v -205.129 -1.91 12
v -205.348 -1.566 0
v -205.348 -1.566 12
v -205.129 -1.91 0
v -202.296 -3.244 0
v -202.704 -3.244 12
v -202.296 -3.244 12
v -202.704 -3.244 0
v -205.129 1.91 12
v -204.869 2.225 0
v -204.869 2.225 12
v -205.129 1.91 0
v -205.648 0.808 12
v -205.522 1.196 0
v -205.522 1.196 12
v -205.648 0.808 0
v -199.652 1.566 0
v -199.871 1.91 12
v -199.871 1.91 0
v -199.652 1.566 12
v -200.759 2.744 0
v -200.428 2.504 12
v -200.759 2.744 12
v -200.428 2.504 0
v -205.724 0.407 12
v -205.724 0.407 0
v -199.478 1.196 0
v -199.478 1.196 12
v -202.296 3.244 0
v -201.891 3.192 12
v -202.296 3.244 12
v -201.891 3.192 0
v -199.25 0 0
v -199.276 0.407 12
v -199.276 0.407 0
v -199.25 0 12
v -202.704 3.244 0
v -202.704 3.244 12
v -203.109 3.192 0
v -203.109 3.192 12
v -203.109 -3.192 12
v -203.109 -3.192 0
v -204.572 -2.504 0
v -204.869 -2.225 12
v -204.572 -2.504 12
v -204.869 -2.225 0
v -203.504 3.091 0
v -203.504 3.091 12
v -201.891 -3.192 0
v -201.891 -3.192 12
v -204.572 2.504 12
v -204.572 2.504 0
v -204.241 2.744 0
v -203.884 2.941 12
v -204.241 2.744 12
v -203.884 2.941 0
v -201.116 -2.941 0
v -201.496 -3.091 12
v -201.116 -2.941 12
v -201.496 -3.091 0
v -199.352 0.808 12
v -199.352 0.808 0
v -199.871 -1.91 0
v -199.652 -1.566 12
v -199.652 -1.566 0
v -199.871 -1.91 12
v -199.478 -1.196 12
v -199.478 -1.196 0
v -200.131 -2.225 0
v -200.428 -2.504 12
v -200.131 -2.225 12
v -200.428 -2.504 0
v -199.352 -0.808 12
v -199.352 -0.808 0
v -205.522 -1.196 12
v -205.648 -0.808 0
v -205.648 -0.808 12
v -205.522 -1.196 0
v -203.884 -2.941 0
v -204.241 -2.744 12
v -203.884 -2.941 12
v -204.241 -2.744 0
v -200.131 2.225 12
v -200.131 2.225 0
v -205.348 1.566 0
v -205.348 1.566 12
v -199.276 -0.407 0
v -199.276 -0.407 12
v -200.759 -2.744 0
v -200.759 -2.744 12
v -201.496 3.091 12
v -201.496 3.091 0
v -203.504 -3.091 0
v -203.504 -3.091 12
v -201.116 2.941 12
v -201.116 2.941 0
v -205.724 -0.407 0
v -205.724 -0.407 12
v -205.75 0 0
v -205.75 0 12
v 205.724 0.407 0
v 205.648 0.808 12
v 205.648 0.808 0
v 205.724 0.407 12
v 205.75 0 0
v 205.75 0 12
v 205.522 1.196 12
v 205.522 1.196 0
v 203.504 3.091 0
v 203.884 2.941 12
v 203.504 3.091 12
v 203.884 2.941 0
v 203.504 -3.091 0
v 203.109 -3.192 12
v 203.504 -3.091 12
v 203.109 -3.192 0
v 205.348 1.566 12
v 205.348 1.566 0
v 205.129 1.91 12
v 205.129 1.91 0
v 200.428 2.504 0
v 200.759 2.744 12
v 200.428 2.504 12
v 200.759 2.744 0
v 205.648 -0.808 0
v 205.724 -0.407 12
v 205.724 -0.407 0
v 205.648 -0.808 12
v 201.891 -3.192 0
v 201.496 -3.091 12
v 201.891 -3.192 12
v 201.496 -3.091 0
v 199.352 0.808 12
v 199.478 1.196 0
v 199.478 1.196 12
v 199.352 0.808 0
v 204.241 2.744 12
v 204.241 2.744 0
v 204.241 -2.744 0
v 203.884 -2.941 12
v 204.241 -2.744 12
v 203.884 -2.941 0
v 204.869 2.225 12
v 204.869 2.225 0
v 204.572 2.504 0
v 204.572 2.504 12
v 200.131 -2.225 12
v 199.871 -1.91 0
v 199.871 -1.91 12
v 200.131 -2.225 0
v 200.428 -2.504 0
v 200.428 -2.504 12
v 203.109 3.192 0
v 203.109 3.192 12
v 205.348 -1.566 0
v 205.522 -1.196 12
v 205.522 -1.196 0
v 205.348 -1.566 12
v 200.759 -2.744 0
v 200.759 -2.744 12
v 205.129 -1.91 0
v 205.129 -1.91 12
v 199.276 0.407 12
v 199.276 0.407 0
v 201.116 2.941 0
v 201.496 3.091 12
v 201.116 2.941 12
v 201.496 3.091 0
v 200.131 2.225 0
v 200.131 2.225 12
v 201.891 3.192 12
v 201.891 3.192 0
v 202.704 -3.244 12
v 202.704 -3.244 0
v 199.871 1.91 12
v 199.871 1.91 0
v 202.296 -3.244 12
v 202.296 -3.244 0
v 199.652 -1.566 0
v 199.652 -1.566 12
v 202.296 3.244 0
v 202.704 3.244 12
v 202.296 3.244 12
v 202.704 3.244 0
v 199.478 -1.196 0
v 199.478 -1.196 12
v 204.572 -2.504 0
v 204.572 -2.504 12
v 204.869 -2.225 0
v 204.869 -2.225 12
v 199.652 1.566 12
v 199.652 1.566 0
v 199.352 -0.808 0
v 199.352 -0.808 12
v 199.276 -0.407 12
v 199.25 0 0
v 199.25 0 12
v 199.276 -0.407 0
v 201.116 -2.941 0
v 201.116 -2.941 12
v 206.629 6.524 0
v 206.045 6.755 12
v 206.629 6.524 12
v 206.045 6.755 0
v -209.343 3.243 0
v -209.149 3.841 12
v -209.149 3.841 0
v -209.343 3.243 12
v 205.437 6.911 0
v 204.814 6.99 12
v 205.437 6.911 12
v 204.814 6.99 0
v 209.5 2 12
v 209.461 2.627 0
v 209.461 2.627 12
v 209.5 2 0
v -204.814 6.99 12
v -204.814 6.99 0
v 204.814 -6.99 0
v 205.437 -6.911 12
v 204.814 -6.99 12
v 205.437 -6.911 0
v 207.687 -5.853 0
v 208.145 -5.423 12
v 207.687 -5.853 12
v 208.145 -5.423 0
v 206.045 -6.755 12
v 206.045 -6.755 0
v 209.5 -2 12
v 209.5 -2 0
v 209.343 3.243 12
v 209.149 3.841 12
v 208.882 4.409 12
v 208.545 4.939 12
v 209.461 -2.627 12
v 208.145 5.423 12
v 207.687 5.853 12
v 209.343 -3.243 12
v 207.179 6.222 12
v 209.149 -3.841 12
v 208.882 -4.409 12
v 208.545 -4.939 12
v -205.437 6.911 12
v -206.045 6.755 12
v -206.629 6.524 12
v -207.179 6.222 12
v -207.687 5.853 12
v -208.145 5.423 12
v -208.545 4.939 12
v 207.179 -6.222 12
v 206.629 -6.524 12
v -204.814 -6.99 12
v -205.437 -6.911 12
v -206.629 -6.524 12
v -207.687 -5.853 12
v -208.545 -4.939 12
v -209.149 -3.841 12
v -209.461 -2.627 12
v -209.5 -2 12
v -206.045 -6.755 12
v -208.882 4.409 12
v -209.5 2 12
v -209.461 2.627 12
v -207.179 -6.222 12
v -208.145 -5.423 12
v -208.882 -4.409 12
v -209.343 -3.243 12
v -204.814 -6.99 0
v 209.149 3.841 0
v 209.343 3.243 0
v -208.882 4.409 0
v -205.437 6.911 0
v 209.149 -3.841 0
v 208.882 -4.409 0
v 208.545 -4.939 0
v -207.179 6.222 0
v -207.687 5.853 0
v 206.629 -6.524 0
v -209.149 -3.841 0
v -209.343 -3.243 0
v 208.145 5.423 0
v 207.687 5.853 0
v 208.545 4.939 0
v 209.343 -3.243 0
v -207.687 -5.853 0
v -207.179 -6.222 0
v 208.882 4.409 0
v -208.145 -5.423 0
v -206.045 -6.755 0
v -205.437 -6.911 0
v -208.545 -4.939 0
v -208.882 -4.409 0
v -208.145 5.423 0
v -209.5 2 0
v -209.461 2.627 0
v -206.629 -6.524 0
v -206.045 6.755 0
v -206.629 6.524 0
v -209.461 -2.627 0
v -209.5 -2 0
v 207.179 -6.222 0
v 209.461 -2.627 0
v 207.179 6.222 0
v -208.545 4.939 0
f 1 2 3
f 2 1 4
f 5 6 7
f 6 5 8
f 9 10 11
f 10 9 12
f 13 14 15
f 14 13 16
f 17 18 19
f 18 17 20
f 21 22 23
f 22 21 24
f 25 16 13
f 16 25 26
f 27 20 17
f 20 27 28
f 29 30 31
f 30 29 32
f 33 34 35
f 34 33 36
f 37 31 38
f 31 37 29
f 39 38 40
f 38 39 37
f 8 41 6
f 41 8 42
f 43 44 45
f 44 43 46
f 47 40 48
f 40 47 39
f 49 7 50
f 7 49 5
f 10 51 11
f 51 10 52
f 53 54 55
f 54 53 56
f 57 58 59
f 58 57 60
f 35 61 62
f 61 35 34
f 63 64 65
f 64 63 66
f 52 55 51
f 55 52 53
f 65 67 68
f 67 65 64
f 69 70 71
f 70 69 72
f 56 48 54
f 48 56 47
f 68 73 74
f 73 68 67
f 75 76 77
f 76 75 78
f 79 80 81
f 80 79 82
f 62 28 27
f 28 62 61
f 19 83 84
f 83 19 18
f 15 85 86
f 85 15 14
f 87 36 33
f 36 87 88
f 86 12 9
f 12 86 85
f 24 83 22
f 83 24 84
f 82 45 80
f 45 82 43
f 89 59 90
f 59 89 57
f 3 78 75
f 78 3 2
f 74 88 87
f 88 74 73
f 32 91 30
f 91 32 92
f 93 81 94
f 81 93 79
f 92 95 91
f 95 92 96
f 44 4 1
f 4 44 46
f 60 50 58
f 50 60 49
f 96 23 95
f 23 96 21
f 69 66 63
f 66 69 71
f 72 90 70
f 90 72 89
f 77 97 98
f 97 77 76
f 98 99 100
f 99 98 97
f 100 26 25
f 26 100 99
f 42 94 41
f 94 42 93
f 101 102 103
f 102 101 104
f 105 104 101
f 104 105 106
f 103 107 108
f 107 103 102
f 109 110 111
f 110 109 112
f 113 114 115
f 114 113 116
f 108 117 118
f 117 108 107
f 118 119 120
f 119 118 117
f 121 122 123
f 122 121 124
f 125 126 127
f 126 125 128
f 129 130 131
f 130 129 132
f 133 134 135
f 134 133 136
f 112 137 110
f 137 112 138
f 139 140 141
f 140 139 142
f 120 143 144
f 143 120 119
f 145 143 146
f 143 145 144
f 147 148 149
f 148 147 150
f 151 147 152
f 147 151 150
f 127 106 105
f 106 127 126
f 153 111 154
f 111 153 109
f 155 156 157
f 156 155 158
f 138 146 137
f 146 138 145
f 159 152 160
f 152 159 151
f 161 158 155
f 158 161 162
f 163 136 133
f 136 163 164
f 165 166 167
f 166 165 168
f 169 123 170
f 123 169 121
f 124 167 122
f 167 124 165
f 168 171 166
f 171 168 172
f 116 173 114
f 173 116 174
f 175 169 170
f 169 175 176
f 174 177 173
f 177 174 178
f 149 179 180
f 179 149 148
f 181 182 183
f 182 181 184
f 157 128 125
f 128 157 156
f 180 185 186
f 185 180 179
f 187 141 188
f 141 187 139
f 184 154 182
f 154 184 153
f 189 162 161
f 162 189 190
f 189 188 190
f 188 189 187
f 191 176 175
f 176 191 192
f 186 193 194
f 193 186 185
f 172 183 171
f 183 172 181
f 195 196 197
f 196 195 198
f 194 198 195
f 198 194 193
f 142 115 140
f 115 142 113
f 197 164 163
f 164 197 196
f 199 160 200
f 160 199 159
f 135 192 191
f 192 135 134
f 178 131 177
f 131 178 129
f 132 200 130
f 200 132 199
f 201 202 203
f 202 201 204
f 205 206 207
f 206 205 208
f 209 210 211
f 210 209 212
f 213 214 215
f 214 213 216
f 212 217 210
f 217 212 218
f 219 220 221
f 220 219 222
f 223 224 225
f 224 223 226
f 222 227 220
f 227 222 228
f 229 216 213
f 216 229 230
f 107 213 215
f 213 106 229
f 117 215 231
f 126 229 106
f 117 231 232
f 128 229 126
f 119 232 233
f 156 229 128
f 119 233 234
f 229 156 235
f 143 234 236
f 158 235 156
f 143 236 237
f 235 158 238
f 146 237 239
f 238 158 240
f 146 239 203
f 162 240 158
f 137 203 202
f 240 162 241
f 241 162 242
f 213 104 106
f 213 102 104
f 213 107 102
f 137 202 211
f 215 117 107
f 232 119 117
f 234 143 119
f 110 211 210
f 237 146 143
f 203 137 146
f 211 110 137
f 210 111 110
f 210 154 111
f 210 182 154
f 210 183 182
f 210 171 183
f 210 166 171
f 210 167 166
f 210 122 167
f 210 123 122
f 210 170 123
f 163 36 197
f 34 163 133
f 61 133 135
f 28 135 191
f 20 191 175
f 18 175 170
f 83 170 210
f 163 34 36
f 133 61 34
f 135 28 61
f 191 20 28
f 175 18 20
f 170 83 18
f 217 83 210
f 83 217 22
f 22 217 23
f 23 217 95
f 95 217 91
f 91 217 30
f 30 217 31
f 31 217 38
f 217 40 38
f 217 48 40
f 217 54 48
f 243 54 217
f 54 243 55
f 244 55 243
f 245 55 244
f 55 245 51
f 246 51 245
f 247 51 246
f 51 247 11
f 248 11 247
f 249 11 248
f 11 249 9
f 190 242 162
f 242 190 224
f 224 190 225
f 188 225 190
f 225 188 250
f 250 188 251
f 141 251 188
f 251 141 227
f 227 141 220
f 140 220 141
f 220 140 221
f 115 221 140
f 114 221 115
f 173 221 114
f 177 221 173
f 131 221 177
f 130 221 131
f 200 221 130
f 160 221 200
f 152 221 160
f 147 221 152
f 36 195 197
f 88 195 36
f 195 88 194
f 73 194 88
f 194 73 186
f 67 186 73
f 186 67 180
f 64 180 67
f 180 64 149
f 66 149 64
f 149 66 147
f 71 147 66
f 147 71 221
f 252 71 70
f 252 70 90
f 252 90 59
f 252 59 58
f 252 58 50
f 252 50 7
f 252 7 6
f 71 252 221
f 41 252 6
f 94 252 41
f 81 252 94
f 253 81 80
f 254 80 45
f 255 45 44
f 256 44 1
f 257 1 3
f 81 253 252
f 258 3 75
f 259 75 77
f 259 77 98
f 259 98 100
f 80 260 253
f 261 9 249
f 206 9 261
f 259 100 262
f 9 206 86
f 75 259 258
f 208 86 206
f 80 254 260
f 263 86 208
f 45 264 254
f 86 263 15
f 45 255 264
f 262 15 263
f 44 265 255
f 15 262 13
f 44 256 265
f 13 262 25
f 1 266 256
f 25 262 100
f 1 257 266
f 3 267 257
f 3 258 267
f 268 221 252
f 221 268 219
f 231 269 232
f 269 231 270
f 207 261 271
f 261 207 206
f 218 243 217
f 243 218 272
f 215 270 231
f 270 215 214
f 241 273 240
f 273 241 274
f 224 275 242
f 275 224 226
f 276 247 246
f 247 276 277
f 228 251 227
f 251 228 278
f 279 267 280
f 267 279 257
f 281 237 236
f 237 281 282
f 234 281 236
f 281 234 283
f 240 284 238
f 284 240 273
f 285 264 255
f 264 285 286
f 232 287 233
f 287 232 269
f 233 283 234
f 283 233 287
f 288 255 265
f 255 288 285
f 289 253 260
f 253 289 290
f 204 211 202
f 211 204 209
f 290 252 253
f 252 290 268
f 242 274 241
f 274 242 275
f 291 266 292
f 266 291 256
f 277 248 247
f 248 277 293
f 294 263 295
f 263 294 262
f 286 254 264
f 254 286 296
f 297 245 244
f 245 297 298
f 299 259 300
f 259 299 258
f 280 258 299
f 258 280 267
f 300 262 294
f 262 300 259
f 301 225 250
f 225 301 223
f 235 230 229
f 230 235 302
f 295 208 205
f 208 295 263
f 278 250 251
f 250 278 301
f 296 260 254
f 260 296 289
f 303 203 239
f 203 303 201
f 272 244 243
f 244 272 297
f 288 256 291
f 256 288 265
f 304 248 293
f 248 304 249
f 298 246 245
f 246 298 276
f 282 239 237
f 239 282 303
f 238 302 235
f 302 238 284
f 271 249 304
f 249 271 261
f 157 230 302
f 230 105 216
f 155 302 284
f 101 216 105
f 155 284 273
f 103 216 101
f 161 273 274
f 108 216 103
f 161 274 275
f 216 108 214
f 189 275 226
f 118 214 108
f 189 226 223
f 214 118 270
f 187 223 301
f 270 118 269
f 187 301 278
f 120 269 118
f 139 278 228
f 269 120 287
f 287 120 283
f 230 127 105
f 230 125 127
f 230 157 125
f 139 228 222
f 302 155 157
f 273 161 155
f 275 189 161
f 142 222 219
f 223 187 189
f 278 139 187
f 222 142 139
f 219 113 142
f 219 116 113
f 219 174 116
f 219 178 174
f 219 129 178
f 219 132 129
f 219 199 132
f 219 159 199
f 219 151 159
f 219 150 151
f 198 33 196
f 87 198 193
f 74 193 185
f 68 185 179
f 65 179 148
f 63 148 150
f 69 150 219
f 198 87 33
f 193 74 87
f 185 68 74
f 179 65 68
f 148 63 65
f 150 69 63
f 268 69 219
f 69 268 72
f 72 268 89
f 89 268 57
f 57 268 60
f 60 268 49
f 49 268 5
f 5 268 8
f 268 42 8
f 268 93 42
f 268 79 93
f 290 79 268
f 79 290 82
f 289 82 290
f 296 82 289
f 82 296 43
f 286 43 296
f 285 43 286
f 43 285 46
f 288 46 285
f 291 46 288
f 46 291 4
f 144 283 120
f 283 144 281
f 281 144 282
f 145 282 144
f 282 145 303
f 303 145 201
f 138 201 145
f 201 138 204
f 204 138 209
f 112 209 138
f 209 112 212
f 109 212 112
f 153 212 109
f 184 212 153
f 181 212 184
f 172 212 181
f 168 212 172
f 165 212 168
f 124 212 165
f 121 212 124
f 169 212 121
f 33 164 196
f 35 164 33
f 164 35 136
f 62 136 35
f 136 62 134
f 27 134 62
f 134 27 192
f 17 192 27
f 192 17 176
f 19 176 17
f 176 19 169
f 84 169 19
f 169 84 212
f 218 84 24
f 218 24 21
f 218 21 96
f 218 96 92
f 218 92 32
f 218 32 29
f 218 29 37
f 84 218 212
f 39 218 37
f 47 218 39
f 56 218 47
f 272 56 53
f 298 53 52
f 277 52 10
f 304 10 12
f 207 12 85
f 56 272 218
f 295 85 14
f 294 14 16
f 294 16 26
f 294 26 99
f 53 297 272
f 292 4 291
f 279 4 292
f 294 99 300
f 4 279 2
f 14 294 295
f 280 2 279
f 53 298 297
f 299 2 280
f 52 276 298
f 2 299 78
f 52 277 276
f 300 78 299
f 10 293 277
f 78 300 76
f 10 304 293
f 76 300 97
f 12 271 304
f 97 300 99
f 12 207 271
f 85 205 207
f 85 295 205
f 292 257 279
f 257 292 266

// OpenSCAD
$fn = 50;


difference() {
	union() {
		hull() {
			translate(v = [-204.5000000000, 2.0000000000, 0]) {
				cylinder(h = 12, r = 5);
			}
			translate(v = [204.5000000000, 2.0000000000, 0]) {
				cylinder(h = 12, r = 5);
			}
			translate(v = [-204.5000000000, -2.0000000000, 0]) {
				cylinder(h = 12, r = 5);
			}
			translate(v = [204.5000000000, -2.0000000000, 0]) {
				cylinder(h = 12, r = 5);
			}
		}
	}
	union() {
		translate(v = [-202.5000000000, 0.0000000000, -100.0000000000]) {
			cylinder(h = 200, r = 3.2500000000);
		}
		translate(v = [-202.5000000000, 0.0000000000, -100.0000000000]) {
			cylinder(h = 200, r = 3.2500000000);
		}
		translate(v = [202.5000000000, 0.0000000000, -100.0000000000]) {
			cylinder(h = 200, r = 3.2500000000);
		}
		translate(v = [202.5000000000, 0.0000000000, -100.0000000000]) {
			cylinder(h = 200, r = 3.2500000000);
		}
	}
}
